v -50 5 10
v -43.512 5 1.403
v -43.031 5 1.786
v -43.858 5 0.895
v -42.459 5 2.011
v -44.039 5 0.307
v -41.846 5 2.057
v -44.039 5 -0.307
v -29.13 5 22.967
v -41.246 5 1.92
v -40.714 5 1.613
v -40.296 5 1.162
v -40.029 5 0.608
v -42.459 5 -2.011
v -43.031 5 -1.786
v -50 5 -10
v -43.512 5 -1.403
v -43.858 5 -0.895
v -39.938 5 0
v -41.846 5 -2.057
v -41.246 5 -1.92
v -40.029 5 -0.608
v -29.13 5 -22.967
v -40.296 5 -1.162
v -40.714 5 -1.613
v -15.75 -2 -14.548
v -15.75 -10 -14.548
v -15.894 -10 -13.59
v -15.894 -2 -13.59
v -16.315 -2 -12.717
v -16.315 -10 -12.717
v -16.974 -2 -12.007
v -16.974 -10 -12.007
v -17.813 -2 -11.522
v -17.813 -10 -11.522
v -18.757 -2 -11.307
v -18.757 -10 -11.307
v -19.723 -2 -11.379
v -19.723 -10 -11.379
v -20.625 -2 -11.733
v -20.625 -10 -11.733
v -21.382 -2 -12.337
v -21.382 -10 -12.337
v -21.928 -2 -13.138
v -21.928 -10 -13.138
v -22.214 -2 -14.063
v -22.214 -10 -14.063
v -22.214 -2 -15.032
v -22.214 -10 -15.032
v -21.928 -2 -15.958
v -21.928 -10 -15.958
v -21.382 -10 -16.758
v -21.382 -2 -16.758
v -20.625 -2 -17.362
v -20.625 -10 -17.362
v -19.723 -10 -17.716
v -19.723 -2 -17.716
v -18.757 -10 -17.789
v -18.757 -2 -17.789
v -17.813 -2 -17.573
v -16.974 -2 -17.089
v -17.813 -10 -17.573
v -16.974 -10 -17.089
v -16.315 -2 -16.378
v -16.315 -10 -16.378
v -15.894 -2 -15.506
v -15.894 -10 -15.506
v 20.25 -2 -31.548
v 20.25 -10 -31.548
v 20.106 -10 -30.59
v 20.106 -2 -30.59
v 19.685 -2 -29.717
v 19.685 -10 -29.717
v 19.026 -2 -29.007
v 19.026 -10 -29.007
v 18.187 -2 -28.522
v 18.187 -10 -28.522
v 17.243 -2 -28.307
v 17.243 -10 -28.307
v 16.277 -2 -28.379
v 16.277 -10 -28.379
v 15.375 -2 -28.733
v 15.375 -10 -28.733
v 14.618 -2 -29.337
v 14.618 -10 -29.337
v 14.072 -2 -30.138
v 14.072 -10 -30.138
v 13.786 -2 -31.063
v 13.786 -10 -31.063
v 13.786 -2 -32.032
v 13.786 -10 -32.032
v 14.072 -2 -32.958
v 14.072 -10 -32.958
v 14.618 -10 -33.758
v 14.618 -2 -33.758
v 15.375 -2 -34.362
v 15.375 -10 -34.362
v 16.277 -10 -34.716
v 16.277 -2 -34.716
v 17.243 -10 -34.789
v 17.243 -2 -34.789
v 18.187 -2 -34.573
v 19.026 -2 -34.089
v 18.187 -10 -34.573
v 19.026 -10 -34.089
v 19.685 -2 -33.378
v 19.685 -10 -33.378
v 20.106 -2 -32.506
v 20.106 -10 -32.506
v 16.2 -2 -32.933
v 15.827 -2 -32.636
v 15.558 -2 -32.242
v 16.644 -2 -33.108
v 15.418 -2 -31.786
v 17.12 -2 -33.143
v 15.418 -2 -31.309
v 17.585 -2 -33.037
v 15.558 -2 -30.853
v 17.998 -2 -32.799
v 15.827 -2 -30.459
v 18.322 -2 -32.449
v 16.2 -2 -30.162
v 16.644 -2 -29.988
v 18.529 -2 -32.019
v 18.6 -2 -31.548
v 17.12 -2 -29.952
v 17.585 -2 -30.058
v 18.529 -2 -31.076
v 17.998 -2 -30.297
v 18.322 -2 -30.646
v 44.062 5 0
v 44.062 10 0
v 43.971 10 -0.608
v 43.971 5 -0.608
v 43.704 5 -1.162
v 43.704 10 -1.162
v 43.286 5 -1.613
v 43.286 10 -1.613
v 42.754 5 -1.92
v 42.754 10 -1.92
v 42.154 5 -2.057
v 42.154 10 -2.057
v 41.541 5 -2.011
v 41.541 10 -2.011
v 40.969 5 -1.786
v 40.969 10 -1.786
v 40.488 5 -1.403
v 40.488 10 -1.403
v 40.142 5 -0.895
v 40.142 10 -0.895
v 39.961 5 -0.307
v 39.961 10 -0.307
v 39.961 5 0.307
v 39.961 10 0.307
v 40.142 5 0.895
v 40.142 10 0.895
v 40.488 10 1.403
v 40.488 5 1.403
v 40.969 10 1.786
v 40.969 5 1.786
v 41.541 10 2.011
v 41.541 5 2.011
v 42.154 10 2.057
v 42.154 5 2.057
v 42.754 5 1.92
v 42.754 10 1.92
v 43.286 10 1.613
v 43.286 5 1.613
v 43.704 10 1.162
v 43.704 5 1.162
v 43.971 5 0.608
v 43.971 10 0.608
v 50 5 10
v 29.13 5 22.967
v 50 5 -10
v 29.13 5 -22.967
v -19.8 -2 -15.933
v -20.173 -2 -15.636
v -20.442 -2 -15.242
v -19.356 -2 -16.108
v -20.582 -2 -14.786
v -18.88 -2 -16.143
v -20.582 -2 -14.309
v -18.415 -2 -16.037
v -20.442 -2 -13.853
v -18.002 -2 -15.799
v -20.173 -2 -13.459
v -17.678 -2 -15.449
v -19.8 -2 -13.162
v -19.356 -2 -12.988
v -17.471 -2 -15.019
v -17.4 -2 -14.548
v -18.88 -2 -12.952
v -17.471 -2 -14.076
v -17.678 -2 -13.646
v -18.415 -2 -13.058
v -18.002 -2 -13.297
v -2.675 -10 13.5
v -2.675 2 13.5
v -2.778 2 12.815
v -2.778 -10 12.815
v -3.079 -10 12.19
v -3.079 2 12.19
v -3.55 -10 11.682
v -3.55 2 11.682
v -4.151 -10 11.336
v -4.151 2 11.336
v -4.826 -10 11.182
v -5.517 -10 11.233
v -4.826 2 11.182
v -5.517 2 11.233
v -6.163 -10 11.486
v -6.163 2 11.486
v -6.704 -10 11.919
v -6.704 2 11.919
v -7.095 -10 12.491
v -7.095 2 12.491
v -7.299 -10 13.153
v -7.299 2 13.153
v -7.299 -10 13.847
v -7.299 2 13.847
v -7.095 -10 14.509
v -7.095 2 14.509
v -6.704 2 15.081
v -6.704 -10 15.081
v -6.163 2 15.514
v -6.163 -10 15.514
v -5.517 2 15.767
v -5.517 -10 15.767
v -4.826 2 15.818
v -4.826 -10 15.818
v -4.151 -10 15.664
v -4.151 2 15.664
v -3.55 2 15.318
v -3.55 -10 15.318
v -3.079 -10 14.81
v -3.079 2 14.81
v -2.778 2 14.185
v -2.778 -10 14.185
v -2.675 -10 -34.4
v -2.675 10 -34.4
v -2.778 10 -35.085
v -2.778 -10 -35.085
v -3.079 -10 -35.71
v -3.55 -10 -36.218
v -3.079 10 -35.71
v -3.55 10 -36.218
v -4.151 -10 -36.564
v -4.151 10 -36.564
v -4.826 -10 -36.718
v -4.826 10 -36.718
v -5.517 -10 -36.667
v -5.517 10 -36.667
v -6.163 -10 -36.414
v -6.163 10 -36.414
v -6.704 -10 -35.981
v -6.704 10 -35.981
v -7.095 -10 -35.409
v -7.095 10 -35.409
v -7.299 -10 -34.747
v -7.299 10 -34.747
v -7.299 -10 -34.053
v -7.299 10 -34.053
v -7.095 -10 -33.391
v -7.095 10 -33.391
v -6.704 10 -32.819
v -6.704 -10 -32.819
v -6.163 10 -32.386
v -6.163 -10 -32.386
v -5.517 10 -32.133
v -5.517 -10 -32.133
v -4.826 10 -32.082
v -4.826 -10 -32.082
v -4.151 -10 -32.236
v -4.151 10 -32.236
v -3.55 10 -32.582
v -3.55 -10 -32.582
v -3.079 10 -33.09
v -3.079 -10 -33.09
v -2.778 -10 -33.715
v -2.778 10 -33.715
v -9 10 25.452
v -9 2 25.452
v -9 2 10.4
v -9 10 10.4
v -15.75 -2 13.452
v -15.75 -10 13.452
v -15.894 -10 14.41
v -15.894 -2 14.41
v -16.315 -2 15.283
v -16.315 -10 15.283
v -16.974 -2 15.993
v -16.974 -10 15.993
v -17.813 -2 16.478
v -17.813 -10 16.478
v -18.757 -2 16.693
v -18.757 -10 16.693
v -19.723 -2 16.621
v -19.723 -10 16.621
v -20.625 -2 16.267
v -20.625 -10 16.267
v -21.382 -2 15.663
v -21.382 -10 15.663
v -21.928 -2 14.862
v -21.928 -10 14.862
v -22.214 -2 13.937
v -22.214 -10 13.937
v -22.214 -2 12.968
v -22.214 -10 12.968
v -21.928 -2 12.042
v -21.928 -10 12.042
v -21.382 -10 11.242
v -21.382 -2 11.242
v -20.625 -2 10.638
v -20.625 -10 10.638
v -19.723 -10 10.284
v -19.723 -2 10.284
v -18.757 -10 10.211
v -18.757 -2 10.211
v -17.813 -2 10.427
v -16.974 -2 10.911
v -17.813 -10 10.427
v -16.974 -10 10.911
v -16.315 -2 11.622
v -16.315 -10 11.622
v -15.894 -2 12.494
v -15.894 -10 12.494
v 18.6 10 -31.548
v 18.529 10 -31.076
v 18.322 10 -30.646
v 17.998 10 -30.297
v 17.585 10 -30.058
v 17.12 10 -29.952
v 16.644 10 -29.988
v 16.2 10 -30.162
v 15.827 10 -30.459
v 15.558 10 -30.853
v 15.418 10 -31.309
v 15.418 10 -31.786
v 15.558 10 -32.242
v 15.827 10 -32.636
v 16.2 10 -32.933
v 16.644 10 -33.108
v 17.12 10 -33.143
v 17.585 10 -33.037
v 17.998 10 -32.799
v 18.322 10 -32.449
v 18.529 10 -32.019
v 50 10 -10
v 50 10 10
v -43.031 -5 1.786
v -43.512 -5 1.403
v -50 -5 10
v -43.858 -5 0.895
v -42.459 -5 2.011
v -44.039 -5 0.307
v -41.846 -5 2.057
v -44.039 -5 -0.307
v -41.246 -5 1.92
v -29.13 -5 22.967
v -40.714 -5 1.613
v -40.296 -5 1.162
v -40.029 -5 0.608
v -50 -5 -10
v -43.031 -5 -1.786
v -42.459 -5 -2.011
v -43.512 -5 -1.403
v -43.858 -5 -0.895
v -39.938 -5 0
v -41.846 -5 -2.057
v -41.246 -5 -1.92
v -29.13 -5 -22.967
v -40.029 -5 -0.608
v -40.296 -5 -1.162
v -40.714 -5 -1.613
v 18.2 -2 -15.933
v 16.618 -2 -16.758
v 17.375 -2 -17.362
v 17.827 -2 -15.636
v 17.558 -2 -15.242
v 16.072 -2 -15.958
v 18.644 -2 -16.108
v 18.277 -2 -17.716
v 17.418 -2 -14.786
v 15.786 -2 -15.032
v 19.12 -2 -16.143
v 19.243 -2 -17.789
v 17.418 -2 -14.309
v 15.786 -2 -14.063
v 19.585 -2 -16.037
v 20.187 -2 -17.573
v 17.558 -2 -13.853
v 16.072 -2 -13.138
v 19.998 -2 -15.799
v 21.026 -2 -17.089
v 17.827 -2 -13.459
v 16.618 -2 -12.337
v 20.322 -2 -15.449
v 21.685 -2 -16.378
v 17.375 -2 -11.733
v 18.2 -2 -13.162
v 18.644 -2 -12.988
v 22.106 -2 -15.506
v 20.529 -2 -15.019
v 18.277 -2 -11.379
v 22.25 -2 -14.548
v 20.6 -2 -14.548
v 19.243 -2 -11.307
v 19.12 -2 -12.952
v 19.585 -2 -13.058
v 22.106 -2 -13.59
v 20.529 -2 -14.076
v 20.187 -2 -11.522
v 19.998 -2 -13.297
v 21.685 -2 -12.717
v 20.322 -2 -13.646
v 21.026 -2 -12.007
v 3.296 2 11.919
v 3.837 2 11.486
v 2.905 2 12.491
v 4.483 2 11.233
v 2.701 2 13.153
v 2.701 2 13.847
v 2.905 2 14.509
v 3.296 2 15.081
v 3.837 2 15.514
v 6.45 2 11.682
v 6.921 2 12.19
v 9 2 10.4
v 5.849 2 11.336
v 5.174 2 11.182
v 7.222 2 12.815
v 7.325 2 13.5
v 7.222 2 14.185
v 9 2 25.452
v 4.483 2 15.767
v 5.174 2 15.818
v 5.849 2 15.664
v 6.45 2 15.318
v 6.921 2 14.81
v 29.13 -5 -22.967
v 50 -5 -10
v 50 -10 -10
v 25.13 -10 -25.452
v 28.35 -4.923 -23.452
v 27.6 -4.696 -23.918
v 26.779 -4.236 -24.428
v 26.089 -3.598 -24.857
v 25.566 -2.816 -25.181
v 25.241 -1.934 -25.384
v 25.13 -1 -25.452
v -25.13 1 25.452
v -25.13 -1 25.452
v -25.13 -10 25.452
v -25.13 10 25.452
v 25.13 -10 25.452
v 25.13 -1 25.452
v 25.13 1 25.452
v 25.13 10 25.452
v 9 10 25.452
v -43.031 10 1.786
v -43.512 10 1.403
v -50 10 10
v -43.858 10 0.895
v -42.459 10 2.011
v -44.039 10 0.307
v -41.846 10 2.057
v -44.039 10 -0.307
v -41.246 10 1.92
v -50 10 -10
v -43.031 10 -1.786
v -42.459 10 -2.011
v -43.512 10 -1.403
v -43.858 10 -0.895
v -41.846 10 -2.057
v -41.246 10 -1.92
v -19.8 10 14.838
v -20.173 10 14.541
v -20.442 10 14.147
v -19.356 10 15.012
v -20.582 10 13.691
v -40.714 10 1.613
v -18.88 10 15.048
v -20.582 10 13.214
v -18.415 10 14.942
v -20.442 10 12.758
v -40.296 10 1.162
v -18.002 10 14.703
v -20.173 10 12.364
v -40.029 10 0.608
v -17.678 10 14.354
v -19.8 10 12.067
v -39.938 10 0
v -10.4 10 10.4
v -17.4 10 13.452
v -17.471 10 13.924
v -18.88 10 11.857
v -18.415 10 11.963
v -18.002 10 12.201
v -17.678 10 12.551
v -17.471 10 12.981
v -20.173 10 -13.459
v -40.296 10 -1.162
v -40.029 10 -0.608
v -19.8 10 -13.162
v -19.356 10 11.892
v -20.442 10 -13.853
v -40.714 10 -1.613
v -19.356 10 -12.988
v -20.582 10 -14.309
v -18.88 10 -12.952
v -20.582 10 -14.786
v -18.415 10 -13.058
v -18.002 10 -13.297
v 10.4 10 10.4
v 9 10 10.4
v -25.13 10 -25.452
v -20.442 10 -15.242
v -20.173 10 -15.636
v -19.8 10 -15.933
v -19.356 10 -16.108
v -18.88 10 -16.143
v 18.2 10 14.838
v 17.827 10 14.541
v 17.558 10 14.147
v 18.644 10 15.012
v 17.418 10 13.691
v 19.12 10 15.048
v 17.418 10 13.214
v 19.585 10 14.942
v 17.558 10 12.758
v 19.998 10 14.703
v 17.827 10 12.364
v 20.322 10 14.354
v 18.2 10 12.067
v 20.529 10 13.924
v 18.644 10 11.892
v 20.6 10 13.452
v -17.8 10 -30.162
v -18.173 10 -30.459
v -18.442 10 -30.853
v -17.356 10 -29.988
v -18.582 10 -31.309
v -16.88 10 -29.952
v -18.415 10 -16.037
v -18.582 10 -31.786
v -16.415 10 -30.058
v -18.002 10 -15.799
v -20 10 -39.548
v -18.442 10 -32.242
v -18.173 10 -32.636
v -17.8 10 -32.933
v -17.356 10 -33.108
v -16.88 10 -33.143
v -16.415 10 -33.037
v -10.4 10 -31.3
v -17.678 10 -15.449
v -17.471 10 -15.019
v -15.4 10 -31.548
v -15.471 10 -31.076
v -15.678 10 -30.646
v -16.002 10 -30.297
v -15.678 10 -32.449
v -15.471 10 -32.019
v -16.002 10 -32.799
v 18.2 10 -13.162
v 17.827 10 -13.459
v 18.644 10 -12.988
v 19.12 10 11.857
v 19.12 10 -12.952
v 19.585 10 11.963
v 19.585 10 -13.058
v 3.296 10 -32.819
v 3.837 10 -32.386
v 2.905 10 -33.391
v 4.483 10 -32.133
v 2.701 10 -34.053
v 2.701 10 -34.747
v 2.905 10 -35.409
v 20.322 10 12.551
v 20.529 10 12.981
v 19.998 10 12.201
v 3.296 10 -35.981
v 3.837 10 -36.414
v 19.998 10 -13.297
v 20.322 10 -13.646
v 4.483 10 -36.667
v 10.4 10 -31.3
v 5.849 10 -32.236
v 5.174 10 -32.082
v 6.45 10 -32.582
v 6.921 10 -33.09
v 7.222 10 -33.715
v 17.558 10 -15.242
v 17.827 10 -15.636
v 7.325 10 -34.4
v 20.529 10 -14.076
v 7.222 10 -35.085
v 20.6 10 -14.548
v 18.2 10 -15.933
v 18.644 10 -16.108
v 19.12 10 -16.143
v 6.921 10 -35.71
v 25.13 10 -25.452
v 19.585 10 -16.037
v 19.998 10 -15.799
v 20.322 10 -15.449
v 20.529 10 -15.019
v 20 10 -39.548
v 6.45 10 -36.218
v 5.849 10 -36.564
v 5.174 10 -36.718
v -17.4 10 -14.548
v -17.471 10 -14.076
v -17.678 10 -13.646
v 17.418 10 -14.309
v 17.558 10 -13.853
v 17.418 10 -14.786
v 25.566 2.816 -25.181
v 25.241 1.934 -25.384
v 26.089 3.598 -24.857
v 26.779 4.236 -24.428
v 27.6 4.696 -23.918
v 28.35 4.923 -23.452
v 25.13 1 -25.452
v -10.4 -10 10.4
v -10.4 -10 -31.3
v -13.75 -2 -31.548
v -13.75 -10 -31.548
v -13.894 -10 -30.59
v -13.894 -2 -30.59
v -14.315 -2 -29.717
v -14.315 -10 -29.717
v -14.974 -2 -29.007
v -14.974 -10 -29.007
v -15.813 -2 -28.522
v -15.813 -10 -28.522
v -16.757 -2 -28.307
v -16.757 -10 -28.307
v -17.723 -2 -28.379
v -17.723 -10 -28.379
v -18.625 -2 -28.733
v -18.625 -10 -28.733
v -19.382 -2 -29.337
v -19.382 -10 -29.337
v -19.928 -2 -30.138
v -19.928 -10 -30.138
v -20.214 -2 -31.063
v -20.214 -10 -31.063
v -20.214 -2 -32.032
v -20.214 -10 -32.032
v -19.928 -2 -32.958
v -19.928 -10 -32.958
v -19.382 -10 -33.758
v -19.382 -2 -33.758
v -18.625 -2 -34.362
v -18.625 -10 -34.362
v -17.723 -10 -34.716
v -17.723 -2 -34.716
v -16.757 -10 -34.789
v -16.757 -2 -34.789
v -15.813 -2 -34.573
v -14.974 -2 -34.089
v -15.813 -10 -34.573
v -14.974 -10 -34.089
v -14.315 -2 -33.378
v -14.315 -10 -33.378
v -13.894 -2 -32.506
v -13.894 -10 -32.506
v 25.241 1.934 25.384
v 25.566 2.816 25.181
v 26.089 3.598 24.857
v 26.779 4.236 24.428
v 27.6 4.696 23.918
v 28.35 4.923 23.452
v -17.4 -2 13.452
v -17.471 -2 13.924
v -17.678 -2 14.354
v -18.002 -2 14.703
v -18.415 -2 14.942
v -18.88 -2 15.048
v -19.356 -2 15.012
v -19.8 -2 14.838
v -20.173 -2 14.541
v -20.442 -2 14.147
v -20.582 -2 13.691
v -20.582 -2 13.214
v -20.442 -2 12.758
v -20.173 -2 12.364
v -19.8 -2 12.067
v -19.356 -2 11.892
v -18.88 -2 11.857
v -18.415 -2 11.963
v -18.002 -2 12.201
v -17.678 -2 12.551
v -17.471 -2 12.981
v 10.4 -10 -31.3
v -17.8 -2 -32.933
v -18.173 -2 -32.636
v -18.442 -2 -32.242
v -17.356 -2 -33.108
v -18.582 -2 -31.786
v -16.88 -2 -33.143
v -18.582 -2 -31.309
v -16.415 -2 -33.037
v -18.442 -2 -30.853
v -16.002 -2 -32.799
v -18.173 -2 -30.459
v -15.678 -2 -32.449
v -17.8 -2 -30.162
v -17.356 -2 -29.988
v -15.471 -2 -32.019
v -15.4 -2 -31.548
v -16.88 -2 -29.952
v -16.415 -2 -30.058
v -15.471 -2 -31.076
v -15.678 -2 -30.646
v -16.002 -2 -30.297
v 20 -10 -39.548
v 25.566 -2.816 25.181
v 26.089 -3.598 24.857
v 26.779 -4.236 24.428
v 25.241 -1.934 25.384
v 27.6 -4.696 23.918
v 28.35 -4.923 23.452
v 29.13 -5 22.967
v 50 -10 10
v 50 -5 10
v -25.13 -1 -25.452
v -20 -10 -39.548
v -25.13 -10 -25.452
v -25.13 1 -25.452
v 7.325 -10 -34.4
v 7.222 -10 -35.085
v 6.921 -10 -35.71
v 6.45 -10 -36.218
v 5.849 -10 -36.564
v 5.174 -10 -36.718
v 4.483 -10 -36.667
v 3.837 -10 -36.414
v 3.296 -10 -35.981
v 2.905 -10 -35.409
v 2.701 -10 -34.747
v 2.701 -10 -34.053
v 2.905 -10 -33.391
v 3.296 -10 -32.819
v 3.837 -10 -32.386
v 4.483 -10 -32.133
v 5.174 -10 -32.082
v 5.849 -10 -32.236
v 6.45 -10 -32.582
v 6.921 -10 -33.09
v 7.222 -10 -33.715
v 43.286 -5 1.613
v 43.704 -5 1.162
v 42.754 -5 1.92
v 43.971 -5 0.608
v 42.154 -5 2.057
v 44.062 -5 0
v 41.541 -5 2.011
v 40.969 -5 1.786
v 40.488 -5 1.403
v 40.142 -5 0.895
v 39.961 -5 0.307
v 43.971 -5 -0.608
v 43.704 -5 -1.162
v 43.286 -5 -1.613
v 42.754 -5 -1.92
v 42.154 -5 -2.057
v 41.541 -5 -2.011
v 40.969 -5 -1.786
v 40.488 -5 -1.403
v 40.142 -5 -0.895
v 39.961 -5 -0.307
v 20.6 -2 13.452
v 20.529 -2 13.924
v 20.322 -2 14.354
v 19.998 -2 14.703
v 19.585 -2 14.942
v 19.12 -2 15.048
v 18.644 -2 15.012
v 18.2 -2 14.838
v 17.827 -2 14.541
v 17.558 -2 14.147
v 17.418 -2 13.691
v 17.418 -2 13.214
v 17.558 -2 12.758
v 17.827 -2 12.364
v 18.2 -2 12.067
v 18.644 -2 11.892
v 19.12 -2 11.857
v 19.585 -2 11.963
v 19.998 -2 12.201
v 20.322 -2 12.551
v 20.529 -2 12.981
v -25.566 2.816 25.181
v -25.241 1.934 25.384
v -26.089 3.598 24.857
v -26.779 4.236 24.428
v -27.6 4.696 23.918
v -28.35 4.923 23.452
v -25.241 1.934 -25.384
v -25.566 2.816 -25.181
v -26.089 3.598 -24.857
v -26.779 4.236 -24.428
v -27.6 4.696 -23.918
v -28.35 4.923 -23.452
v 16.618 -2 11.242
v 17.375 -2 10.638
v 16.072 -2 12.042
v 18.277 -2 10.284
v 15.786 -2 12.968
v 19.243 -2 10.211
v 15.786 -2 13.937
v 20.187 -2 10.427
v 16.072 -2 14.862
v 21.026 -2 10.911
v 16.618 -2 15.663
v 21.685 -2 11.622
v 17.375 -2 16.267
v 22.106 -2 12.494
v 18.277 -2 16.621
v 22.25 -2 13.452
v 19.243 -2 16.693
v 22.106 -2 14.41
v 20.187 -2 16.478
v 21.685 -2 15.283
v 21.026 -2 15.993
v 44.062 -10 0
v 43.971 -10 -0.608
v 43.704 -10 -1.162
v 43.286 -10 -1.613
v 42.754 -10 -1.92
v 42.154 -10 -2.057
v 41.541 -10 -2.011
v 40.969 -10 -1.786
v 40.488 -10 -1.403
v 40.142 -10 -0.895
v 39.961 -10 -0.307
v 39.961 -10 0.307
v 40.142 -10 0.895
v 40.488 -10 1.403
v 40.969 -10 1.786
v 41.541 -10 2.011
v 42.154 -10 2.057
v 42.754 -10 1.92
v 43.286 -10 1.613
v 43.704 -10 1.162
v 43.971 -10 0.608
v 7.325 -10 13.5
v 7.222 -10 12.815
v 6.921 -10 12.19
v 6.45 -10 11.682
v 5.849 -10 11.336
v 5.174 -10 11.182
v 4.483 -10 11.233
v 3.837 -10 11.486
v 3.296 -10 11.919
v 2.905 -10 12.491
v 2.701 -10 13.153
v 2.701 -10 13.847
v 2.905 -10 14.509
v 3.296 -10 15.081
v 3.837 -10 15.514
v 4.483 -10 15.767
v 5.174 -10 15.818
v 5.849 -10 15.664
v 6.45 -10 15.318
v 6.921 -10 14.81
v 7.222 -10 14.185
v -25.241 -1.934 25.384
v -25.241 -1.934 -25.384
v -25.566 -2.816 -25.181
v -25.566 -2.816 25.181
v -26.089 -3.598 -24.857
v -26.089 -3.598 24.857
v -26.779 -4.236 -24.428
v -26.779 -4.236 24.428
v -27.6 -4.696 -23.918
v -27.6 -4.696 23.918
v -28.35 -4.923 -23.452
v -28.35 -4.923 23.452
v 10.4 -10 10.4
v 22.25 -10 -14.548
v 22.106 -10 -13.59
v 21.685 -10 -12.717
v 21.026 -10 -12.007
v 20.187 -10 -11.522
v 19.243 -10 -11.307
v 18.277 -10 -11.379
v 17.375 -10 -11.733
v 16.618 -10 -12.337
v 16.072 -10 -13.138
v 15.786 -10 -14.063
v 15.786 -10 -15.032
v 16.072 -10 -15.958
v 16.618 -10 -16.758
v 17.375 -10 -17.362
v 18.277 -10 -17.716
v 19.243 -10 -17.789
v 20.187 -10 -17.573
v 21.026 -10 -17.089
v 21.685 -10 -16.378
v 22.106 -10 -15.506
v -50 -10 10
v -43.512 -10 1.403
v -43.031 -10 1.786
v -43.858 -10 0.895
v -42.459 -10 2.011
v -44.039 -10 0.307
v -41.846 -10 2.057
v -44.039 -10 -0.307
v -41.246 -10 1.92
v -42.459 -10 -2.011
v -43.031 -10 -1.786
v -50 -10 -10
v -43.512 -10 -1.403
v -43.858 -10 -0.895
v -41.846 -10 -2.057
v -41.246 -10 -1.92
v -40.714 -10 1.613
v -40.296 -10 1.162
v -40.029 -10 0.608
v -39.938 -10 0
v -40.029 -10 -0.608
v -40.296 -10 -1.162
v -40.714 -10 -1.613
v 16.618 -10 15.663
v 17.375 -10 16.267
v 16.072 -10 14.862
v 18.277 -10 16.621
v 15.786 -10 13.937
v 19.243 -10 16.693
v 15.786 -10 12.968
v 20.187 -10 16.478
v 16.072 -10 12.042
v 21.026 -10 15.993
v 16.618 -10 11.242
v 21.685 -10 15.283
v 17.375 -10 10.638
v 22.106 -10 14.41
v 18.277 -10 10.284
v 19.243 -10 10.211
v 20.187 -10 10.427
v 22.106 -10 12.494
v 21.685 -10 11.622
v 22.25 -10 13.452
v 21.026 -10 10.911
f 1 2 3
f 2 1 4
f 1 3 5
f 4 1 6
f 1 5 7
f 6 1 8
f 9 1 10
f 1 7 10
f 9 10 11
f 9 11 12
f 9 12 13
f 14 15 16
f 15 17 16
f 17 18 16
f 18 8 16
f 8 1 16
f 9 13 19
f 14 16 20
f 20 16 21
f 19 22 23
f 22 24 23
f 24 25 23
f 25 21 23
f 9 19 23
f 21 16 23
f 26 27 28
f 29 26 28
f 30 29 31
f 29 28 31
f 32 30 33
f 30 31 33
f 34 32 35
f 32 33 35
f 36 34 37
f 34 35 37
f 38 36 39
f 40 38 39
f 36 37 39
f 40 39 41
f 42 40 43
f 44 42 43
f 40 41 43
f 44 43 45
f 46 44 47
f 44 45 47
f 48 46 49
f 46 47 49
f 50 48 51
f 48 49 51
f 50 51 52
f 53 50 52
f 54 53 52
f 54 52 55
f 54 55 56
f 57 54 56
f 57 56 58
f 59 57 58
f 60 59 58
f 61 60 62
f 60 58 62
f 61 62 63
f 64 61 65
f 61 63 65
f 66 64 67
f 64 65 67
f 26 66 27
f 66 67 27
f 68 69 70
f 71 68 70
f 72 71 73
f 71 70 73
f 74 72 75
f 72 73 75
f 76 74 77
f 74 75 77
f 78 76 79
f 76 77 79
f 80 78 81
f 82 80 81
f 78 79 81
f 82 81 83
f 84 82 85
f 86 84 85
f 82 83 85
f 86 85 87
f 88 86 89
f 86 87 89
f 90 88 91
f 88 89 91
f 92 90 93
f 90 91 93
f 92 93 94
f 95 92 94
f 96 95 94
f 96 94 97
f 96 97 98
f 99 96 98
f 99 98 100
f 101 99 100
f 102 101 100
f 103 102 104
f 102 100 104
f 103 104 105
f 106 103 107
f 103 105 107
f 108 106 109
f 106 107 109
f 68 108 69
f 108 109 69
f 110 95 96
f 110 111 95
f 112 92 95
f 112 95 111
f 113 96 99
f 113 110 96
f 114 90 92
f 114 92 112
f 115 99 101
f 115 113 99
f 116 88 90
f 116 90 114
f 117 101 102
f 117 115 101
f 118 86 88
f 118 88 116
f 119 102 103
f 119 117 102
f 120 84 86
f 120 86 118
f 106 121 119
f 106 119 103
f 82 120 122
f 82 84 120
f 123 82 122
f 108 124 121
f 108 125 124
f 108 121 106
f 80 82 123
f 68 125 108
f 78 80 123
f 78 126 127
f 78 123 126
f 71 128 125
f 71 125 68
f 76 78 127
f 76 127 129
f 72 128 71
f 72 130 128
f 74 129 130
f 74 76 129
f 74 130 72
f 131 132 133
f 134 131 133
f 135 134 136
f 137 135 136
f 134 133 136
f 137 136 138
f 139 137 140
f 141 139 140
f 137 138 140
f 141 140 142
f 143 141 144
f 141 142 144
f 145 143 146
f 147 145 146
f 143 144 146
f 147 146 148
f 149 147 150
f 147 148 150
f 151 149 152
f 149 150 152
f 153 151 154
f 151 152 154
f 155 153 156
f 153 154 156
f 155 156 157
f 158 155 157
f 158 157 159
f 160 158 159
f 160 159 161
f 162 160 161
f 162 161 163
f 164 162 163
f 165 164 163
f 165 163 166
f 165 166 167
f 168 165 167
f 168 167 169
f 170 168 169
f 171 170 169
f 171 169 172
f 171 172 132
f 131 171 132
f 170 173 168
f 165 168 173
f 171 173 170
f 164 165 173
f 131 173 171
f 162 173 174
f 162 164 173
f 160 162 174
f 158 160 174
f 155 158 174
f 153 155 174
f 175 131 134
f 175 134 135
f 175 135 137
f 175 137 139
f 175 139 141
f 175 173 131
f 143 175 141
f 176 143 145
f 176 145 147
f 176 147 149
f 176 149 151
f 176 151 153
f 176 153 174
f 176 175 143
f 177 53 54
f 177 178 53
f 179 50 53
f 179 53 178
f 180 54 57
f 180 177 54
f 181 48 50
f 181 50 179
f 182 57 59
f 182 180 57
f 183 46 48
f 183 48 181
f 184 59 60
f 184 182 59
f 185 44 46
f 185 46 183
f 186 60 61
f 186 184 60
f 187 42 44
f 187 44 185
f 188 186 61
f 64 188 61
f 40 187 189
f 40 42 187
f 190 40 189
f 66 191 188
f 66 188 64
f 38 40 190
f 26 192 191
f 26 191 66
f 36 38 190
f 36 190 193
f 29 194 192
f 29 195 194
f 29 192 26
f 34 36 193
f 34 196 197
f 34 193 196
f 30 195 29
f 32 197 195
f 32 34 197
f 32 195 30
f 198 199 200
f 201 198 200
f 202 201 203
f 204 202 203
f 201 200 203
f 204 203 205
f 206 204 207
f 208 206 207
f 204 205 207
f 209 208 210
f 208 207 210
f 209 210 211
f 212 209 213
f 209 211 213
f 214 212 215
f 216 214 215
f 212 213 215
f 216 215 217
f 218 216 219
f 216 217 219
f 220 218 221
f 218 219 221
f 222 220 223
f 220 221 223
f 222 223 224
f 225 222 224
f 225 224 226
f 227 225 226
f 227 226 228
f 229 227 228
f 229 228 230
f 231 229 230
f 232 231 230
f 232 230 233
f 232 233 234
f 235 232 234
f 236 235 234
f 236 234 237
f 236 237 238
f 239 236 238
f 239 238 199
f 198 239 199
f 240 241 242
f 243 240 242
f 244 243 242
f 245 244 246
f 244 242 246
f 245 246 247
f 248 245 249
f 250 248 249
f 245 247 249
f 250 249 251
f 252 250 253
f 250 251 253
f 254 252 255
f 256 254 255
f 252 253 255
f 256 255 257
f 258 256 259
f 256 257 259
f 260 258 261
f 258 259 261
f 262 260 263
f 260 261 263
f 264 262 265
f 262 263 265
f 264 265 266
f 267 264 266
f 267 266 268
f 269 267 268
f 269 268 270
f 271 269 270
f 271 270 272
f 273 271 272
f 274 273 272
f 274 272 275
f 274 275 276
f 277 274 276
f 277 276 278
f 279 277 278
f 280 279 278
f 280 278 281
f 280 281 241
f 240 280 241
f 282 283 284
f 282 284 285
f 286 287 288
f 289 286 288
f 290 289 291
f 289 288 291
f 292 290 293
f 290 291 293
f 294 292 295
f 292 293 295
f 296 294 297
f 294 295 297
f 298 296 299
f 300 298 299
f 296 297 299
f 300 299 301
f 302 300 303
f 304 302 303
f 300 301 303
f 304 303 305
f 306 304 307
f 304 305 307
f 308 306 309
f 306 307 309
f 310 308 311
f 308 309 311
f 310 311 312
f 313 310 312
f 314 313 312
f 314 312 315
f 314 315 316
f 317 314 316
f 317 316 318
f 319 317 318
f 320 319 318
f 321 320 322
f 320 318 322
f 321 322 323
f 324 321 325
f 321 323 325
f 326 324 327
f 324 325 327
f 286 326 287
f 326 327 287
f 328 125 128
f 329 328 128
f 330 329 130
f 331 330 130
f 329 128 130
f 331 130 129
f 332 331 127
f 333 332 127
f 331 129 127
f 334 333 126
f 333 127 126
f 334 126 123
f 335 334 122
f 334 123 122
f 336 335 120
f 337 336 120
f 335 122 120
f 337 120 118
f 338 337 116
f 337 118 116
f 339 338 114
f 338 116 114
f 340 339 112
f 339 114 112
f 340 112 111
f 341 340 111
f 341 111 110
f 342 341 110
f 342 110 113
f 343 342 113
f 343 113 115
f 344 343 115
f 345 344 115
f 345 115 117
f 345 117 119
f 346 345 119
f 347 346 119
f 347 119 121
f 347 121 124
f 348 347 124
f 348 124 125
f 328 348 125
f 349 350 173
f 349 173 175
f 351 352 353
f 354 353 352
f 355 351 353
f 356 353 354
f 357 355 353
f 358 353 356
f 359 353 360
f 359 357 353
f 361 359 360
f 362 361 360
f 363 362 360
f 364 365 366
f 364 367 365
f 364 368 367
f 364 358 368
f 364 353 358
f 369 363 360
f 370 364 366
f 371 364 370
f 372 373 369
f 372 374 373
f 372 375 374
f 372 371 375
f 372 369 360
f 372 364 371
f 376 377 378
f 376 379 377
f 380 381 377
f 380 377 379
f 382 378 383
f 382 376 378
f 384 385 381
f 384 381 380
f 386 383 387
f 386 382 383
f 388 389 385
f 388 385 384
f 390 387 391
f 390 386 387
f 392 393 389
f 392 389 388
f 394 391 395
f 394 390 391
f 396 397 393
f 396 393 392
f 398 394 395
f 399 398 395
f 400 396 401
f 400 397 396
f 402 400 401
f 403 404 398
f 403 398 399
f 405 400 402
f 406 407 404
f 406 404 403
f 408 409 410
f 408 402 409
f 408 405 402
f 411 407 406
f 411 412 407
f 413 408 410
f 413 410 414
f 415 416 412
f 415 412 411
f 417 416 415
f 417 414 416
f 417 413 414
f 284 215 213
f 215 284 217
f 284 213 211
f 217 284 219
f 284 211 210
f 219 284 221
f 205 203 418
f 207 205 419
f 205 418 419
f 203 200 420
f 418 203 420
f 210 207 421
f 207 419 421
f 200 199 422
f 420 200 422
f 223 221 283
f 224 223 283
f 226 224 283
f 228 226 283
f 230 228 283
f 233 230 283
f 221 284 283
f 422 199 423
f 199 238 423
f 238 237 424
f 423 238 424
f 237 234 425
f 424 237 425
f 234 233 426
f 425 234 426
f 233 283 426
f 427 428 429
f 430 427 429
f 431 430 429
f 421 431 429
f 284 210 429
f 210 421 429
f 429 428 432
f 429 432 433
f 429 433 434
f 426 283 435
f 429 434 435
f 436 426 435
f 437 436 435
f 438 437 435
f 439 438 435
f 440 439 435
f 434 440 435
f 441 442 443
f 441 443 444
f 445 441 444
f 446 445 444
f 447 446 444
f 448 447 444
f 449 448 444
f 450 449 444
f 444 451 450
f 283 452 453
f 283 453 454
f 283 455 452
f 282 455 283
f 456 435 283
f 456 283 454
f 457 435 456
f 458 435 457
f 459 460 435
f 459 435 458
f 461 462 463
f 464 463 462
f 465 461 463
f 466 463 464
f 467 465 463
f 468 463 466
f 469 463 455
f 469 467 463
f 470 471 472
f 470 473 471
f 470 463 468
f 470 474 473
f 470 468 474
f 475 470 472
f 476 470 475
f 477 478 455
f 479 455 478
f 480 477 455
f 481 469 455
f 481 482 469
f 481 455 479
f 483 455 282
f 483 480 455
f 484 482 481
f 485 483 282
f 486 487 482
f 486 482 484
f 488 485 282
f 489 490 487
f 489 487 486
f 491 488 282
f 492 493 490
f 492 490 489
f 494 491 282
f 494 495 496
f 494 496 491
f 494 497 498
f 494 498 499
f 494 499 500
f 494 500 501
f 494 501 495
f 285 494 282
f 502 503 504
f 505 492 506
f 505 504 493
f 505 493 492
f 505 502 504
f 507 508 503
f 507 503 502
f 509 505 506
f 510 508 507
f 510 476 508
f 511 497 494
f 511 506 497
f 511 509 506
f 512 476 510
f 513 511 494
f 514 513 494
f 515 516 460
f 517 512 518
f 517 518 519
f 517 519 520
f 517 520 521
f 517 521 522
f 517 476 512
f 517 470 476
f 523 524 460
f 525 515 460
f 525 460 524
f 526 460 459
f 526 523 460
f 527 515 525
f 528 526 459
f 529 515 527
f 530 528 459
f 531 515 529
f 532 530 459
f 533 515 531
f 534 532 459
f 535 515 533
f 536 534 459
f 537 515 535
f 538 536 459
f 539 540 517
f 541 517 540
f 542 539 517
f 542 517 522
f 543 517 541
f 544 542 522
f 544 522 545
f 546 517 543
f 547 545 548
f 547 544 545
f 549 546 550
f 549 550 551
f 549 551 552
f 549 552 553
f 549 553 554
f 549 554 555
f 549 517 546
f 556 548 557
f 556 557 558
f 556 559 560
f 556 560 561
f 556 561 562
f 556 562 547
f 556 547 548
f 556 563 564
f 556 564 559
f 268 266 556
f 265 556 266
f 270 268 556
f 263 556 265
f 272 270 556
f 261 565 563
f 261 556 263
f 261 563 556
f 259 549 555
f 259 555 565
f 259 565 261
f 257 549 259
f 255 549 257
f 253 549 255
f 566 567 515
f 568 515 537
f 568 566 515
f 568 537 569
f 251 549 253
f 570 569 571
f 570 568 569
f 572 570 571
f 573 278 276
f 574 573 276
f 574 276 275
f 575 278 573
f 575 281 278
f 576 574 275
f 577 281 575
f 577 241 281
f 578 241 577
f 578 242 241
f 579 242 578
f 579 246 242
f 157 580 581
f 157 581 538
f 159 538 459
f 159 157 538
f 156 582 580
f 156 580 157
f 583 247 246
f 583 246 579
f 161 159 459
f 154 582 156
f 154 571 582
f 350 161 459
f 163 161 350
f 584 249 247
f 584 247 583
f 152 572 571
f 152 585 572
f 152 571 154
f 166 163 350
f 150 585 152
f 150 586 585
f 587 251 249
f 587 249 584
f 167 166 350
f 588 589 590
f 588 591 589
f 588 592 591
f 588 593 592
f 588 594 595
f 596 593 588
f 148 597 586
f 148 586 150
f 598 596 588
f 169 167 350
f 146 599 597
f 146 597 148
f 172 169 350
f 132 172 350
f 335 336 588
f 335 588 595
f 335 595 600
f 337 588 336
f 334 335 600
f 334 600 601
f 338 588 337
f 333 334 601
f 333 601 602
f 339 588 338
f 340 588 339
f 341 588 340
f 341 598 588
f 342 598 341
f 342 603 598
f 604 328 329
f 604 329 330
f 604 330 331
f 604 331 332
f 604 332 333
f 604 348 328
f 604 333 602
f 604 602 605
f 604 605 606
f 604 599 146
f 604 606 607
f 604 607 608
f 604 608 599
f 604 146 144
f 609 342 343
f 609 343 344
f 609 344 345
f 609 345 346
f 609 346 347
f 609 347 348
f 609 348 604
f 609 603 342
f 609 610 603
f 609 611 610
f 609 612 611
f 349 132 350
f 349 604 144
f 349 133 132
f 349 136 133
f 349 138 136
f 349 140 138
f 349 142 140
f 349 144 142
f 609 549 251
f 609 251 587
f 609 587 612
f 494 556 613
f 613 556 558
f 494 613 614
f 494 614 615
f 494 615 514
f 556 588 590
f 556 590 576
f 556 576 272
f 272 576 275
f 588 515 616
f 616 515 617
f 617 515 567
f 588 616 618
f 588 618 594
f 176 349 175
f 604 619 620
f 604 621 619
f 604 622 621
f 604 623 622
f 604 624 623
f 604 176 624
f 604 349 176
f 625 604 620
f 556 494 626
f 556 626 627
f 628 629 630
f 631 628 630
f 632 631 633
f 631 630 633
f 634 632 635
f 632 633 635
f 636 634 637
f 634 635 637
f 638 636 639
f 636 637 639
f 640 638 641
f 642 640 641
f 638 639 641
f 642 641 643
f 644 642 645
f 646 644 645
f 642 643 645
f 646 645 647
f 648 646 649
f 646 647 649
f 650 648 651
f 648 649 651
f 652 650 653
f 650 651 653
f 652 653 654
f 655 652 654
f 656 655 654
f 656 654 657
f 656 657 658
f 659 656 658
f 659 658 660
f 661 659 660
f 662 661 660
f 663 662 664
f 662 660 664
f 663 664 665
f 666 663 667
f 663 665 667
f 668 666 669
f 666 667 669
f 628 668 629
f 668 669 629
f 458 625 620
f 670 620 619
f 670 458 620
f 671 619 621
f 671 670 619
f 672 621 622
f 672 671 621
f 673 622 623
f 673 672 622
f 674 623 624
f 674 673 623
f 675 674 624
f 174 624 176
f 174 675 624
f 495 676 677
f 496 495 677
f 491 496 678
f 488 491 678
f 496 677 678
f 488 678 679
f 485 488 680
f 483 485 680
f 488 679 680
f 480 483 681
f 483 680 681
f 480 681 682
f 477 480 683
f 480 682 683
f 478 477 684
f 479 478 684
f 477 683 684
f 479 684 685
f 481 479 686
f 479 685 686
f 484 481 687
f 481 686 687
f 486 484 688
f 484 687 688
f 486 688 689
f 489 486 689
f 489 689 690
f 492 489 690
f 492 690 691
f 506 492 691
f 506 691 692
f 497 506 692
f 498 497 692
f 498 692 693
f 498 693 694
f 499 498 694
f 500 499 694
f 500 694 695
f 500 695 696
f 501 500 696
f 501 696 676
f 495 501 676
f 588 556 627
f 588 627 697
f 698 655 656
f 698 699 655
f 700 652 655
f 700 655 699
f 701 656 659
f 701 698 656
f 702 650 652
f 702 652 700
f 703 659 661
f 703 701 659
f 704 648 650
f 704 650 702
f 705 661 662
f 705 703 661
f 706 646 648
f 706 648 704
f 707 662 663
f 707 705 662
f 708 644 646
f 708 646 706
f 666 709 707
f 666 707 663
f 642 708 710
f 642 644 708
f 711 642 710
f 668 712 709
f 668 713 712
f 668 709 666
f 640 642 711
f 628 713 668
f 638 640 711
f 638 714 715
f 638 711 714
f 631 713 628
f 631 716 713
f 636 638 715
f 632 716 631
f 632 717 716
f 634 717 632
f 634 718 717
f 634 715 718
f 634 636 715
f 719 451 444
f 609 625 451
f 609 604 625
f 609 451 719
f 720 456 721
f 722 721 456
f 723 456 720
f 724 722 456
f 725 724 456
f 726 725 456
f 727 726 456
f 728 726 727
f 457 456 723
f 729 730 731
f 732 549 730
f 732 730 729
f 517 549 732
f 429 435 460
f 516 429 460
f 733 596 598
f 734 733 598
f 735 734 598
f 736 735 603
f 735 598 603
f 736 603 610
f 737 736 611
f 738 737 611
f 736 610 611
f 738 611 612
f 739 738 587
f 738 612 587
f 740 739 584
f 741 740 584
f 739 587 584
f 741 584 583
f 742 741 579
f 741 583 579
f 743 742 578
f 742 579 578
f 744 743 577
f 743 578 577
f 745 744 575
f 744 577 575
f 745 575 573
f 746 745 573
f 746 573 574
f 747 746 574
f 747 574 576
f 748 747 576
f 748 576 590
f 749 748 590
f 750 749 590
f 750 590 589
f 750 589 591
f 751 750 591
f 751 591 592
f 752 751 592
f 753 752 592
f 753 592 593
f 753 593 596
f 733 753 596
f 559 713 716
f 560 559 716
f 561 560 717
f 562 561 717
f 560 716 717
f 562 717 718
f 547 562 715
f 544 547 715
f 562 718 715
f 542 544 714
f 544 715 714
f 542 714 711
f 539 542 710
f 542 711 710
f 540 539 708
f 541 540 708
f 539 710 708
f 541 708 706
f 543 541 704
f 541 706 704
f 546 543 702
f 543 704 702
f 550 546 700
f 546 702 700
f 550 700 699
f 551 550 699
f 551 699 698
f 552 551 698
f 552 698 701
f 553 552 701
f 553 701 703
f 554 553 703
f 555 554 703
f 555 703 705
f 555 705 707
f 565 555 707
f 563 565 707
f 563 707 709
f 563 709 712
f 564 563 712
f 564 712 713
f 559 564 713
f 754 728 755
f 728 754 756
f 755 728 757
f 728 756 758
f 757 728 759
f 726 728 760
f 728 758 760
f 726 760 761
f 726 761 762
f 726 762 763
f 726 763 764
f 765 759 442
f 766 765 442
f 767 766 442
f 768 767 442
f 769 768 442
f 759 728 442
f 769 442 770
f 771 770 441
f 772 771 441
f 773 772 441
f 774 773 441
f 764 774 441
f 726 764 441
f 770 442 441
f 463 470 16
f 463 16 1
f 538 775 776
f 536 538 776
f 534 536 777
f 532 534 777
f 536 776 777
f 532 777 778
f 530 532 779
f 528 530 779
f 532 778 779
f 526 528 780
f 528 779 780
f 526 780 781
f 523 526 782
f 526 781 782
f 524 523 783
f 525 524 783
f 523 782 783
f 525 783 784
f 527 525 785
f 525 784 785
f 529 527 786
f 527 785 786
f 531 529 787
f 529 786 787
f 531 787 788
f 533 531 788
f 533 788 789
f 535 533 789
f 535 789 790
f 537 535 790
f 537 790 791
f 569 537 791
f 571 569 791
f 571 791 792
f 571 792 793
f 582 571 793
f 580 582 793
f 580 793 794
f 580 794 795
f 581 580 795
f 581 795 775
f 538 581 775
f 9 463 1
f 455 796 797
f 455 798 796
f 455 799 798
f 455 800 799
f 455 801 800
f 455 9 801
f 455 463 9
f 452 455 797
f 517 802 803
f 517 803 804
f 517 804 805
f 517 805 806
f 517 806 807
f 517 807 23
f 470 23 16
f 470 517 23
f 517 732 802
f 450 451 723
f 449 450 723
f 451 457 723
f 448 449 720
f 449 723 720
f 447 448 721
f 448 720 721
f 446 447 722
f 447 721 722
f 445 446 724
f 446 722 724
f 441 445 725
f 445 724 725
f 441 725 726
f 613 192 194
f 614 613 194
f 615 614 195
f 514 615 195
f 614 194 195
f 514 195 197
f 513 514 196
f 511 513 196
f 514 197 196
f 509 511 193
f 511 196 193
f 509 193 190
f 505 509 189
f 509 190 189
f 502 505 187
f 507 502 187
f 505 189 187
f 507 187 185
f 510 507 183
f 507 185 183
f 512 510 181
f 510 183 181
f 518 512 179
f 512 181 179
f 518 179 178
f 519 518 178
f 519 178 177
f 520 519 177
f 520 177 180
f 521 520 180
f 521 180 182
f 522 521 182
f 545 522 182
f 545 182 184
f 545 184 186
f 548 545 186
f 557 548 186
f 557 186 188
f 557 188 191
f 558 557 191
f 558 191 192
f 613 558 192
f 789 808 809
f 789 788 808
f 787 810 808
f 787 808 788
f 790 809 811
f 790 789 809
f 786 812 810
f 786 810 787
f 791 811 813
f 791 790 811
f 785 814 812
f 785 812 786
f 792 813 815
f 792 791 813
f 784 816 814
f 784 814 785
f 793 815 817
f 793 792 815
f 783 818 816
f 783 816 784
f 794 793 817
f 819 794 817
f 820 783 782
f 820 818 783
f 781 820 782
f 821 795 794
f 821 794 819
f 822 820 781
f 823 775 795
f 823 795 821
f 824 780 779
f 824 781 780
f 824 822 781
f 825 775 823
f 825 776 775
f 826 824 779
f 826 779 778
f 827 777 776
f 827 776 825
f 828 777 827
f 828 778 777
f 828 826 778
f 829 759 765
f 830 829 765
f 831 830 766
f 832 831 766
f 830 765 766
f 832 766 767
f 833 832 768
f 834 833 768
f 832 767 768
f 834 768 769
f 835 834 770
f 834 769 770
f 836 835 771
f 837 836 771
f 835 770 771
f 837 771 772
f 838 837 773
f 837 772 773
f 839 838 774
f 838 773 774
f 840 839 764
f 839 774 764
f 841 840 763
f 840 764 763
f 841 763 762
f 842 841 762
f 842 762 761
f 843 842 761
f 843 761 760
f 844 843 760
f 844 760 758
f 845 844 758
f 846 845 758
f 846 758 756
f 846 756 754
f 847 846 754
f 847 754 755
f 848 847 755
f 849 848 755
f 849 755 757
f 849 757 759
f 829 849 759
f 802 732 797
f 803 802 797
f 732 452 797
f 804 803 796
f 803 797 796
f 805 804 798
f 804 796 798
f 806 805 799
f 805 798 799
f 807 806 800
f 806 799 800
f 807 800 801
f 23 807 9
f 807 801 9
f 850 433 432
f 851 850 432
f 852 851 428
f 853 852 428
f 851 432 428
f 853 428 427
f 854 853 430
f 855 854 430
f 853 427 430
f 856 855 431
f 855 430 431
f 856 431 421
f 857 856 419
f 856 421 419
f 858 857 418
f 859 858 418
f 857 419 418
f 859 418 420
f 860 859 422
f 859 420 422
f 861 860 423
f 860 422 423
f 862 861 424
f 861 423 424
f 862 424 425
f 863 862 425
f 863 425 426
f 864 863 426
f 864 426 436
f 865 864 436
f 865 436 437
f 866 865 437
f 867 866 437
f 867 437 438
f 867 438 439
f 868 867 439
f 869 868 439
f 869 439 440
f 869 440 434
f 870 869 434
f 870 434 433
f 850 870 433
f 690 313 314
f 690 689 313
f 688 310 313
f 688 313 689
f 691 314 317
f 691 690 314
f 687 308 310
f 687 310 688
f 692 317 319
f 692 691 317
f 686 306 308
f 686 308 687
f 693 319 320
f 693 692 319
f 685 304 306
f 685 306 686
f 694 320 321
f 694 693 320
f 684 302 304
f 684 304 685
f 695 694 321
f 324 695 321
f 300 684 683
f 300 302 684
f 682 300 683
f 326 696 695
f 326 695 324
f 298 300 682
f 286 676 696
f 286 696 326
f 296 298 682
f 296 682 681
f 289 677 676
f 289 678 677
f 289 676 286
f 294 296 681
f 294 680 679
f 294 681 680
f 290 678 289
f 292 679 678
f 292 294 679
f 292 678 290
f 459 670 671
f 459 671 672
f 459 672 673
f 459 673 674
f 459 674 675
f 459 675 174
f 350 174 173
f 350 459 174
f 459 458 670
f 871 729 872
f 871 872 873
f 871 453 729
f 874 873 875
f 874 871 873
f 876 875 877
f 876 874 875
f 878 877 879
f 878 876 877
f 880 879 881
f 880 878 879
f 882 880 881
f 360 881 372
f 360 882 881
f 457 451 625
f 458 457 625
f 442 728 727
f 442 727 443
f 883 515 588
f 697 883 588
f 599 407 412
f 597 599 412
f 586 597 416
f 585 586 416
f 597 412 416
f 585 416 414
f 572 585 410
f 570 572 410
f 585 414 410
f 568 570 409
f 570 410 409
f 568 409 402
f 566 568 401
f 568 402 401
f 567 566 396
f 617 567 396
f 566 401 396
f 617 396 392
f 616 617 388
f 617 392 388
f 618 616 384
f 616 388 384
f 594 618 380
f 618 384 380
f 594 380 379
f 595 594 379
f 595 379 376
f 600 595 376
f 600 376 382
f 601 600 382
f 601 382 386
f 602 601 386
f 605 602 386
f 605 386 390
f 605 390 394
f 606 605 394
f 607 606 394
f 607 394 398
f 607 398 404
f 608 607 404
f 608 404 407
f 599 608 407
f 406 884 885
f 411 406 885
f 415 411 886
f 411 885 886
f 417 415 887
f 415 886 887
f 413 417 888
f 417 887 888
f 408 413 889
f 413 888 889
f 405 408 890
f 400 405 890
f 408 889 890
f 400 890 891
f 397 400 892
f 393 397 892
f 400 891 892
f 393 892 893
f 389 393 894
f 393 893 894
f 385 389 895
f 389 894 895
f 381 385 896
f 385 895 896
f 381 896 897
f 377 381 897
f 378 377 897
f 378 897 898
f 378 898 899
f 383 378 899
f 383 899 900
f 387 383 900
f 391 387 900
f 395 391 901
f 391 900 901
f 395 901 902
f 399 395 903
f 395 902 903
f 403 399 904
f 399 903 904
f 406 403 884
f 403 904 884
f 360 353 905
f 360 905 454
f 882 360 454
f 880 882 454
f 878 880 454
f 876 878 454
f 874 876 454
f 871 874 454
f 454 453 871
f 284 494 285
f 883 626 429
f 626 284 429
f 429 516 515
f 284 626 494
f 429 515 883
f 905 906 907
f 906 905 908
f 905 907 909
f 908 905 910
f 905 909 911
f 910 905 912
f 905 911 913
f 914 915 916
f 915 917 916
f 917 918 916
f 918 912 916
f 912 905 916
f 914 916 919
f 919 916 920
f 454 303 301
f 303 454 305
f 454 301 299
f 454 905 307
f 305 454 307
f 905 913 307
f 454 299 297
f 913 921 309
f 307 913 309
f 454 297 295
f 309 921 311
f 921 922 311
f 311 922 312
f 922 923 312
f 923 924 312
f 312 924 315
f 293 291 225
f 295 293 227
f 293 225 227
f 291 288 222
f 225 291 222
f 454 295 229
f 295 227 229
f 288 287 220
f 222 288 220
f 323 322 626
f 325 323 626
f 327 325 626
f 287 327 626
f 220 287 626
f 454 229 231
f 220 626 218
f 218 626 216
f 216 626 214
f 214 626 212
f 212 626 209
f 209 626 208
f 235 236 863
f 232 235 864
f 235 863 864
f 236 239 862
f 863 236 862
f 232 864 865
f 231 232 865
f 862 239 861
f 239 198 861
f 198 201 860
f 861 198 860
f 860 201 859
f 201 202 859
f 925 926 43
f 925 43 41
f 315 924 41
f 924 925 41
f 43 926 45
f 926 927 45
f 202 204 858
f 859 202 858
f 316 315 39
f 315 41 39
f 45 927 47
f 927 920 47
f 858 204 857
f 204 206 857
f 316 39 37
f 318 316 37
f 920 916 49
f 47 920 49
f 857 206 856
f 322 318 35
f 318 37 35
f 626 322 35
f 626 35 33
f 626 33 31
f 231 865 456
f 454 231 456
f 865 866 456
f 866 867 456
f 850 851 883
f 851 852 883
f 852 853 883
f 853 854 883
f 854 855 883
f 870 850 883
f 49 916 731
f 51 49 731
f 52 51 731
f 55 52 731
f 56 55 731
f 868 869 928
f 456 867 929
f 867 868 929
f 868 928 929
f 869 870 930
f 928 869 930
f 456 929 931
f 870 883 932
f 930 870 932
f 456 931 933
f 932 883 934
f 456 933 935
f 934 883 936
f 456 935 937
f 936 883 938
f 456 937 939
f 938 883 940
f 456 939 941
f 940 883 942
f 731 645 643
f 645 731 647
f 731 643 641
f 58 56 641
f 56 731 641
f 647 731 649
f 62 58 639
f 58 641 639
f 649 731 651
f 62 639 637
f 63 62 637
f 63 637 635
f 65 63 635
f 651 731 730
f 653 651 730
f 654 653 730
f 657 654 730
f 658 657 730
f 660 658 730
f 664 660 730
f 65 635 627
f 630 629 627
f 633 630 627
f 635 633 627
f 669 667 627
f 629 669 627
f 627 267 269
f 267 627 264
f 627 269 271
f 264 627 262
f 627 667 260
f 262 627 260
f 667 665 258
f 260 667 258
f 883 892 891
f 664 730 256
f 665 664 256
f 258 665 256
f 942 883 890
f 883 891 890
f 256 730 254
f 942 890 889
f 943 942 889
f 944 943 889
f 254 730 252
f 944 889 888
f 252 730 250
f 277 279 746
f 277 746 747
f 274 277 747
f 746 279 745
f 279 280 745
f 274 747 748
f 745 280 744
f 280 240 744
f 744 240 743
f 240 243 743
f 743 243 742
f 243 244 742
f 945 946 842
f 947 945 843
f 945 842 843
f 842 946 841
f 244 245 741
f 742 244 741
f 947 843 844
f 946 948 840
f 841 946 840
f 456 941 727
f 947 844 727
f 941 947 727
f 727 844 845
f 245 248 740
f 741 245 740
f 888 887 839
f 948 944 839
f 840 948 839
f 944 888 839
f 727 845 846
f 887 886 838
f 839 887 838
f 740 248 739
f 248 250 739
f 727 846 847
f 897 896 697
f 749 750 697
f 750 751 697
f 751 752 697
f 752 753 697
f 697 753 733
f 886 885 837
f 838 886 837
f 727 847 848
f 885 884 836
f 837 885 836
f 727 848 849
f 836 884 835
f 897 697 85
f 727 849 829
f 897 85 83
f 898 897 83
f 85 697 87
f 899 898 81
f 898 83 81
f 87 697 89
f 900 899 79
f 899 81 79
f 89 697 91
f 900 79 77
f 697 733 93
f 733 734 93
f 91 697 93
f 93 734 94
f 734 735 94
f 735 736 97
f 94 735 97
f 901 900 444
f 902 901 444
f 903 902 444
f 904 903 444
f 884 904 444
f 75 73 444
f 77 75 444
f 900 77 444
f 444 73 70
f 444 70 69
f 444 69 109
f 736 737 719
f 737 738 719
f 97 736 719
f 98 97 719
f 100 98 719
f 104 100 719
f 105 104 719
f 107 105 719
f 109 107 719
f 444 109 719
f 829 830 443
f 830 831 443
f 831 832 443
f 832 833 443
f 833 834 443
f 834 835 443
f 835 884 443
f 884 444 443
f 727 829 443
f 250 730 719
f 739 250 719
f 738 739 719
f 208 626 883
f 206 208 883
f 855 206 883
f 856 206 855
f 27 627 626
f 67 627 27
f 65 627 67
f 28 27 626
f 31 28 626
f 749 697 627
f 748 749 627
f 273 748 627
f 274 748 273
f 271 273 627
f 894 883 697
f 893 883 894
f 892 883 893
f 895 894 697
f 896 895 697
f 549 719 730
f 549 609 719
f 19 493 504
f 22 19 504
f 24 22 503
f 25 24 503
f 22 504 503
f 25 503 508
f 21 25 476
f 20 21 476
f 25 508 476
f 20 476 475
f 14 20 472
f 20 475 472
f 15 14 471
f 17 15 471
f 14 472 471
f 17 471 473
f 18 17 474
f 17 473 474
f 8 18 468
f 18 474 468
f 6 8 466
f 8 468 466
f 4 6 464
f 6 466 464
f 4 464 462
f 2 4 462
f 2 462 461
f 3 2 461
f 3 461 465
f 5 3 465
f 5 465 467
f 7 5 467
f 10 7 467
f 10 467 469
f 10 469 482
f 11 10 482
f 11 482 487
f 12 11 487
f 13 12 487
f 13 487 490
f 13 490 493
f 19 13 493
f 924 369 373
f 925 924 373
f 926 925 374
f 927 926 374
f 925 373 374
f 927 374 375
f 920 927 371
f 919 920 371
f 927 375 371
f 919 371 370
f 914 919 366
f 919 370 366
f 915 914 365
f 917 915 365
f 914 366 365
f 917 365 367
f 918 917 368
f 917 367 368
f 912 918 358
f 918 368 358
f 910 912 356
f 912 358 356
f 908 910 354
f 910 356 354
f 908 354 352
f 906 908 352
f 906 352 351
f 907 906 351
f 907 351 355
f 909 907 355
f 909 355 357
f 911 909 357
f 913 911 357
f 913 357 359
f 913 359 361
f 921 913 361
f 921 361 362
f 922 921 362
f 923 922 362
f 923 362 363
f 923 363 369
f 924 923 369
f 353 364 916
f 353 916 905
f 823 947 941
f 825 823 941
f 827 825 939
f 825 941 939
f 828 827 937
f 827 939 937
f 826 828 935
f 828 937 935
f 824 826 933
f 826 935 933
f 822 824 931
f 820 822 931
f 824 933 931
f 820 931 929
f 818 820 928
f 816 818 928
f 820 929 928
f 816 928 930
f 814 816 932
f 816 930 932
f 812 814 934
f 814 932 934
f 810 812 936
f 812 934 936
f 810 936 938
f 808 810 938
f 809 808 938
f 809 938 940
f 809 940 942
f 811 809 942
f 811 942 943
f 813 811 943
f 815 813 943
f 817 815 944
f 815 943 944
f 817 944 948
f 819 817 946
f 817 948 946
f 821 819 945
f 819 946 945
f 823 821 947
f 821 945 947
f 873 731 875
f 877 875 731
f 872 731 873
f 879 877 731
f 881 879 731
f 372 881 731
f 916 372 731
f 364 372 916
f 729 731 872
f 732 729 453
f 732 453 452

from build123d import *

# Parameters (mm, degrees)
MAIN_BODY_DEPTH           = 10
SKETCH2_R                 = 2.325
SKETCH2_R_2               = 2.0625
SKETCH2_W                 = 20.8
SKETCH2_H                 = 41.7
SERVO_ROTROD_CUTOUT_DEPTH = 30
SKETCH3_W                 = 18
SKETCH3_H                 = 8
SERVO_CABLE_CUTOUT_DEPTH  = 56.752305
CONTROL_ARM_CUTOUT_START  = -66
SKETCH4_W                 = 24.86969785
SKETCH4_H                 = 10
CONTROL_ARM_CUTOUT_DEPTH  = 67
FILLET1_R                 = 4
SKETCH6_R                 = 1.6
MOUNT_HOLES_CHASSIS_DEPTH = 21
SKETCH7_R                 = 3.25
BOLT_HEAD_HOLES_DEPTH     = 8


with BuildPart() as part:
    # Sketch1 → Main-Body (new body, symmetric)
    with BuildSketch(Plane(origin=(0, 0, 0), x_dir=(1, 0, 0), z_dir=(0, 1, 0))):
        Polygon((20, 39.547694656), (-20, 39.547694656), (-25.13030215, 25.452305344), (-50, 10), (-50, -10), (-25.13030215, -25.452305344), (25.13030215, -25.452305344), (50, -10), (50, 10), (25.13030215, 25.452305344), align=None)
    extrude(amount=MAIN_BODY_DEPTH, both=True)

    # Sketch2 → Servo&RotRod-Cutout (cut)
    with BuildSketch(Plane(origin=(0, 10, 0), x_dir=(1, 0, 0), z_dir=(0, 1, 0))):
        with Locations((-5, -13.5)):
            Circle(SKETCH2_R)
        with Locations((5, -13.5)):
            Circle(SKETCH2_R)
        with Locations((-5, 34.4)):
            Circle(SKETCH2_R)
        with Locations((5, 34.4)):
            Circle(SKETCH2_R)
        with Locations((-42, 0)):
            Circle(SKETCH2_R_2)
        with Locations((42, 0)):
            Circle(SKETCH2_R_2)
        with Locations((0, 10.45)):
            Rectangle(SKETCH2_W, SKETCH2_H)
    extrude(amount=-SERVO_ROTROD_CUTOUT_DEPTH, mode=Mode.SUBTRACT)

    # Sketch3 → Servo-Cable-Cutout (cut)
    with BuildSketch(Plane.XY.offset(25.452305344)):
        with Locations((0, 6)):
            Rectangle(SKETCH3_W, SKETCH3_H)
    extrude(amount=-SERVO_CABLE_CUTOUT_DEPTH, mode=Mode.SUBTRACT)

    # Sketch4 → Control-Arm-Cutout (cut)
    with BuildSketch(Plane.XY.offset(25.452305344).offset(CONTROL_ARM_CUTOUT_START)):
        with Locations((-37.565151075, 0)):
            Rectangle(SKETCH4_W, SKETCH4_H)
    control_arm_cutout = extrude(amount=CONTROL_ARM_CUTOUT_DEPTH, mode=Mode.SUBTRACT)

    # Mirror1: Control-Arm-Cutout across plane
    add(control_arm_cutout.mirror(Plane(origin=(0, 0, 0), x_dir=(0, 0, 1), z_dir=(1, 0, 0))), mode=Mode.SUBTRACT)

    # Fillet1
    fillet1_edges = [part.edges().sort_by_distance(p)[0] for p in [
        (-25.13030215, 5, 0),
        (-25.13030215, -5, 0),
        (25.13030215, -5, 0),
        (25.13030215, 5, 0),
    ]]
    fillet(fillet1_edges, radius=FILLET1_R)

    # Sketch6 → Mount-Holes-Chassis (cut, through all)
    with BuildSketch(Plane.XZ.offset(10)):
        with Locations((19, -14.547694656)):
            Circle(SKETCH6_R)
        with Locations((19, 13.452305344)):
            Circle(SKETCH6_R)
        with Locations((17, -31.547694656)):
            Circle(SKETCH6_R)
        with Locations((-17, -31.547694656)):
            Circle(SKETCH6_R)
        with Locations((-19, 13.452305344)):
            Circle(SKETCH6_R)
        with Locations((-19, -14.547694656)):
            Circle(SKETCH6_R)
    extrude(amount=-MOUNT_HOLES_CHASSIS_DEPTH, mode=Mode.SUBTRACT)

    # Sketch7 → Bolt-Head-Holes (cut)
    with BuildSketch(Plane.XZ.offset(10)):
        with Locations((17, -31.547694656)):
            Circle(SKETCH7_R)
        with Locations((19, -14.547694656)):
            Circle(SKETCH7_R)
        with Locations((19, 13.452305344)):
            Circle(SKETCH7_R)
        with Locations((-19, 13.452305344)):
            Circle(SKETCH7_R)
        with Locations((-19, -14.547694656)):
            Circle(SKETCH7_R)
        with Locations((-17, -31.547694656)):
            Circle(SKETCH7_R)
    extrude(amount=-BOLT_HEAD_HOLES_DEPTH, mode=Mode.SUBTRACT)


solid = part.part
